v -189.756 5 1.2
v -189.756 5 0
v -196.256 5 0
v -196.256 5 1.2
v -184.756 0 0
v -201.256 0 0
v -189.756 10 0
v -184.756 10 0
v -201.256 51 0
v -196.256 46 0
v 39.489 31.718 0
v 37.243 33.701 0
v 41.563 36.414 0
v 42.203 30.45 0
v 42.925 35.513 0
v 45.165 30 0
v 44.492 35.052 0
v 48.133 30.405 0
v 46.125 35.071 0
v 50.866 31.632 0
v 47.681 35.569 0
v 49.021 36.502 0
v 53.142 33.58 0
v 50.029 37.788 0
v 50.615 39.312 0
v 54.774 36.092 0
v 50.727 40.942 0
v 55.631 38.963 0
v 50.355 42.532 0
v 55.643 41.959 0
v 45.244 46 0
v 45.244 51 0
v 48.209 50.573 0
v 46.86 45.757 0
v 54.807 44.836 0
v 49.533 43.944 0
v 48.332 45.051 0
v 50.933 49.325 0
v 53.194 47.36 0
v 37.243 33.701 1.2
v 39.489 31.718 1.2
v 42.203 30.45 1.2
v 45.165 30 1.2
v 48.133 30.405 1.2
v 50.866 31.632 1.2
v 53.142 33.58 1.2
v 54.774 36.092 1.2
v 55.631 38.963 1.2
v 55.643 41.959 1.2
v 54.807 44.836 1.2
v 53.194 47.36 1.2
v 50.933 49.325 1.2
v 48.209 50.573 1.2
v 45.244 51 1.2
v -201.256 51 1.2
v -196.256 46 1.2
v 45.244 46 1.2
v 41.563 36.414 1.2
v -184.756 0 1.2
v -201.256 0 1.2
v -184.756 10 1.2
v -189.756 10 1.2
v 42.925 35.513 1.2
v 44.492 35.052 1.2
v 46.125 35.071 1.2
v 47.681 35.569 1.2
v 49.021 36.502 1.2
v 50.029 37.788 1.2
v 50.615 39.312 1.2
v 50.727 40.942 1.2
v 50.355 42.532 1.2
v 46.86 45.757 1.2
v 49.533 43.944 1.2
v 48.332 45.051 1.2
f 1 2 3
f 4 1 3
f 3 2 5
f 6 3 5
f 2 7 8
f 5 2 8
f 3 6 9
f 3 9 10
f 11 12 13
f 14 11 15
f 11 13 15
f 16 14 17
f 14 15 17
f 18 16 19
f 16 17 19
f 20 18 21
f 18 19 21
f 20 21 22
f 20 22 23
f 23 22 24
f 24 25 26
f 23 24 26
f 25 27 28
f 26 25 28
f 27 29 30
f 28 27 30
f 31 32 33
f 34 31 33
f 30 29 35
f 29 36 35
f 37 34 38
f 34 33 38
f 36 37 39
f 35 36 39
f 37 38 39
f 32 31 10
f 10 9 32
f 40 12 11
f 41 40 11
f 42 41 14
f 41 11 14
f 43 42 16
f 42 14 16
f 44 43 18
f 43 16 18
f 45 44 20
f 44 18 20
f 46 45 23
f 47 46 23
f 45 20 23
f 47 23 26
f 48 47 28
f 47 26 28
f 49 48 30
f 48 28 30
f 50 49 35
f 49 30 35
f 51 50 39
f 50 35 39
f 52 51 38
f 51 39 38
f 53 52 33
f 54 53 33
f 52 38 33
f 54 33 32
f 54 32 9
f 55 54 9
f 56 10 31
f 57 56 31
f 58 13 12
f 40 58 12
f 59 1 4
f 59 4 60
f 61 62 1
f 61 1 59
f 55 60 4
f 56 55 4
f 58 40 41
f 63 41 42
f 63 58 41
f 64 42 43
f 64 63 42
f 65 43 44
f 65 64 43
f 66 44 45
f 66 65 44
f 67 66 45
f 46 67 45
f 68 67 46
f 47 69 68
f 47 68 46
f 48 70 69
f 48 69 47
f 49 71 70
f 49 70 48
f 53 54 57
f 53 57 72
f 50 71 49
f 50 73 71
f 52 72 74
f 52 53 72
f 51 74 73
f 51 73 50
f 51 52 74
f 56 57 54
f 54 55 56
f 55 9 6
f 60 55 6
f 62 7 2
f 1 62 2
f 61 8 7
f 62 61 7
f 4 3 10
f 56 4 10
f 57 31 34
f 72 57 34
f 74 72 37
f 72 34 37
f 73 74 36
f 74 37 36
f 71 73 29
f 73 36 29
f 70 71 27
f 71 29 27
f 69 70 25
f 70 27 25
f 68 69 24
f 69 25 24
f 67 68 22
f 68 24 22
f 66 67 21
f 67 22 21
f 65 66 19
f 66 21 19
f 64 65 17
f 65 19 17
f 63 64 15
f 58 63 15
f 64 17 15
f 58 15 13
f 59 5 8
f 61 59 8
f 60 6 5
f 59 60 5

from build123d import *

# Parameters (mm, degrees)
F1_DEPTH = 1.2


with BuildPart() as f1:
    # F0 (on Top) → F1 (new body)
    with BuildSketch(Plane.XY):
        with BuildLine():
            Line((-201.25569, 51), (-201.25569, 0))
            Line((-201.25569, 0), (-184.75569, 0))
            Line((-184.75569, 0), (-184.75569, 10))
            Line((-184.75569, 10), (-189.75569, 10))
            Line((-189.75569, 10), (-189.75569, 5))
            Line((-189.75569, 5), (-196.25569, 5))
            Line((-196.25569, 5), (-196.25569, 46))
            Line((-196.25569, 46), (-184.75569, 46))
            Line((-184.75569, 46), (45.24431, 46))
            ThreePointArc((45.24431, 46), (50.378713, 38.528222), (41.562891, 36.413785))
            Line((41.562891, 36.413785), (37.243051, 33.700747))
            ThreePointArc((37.243051, 33.700747), (54.77432, 36.092175), (45.24431, 51))
            Line((45.24431, 51), (-184.75569, 51))
            Line((-184.75569, 51), (-201.25569, 51))
        make_face()
    extrude(amount=F1_DEPTH)


solid = f1.part
